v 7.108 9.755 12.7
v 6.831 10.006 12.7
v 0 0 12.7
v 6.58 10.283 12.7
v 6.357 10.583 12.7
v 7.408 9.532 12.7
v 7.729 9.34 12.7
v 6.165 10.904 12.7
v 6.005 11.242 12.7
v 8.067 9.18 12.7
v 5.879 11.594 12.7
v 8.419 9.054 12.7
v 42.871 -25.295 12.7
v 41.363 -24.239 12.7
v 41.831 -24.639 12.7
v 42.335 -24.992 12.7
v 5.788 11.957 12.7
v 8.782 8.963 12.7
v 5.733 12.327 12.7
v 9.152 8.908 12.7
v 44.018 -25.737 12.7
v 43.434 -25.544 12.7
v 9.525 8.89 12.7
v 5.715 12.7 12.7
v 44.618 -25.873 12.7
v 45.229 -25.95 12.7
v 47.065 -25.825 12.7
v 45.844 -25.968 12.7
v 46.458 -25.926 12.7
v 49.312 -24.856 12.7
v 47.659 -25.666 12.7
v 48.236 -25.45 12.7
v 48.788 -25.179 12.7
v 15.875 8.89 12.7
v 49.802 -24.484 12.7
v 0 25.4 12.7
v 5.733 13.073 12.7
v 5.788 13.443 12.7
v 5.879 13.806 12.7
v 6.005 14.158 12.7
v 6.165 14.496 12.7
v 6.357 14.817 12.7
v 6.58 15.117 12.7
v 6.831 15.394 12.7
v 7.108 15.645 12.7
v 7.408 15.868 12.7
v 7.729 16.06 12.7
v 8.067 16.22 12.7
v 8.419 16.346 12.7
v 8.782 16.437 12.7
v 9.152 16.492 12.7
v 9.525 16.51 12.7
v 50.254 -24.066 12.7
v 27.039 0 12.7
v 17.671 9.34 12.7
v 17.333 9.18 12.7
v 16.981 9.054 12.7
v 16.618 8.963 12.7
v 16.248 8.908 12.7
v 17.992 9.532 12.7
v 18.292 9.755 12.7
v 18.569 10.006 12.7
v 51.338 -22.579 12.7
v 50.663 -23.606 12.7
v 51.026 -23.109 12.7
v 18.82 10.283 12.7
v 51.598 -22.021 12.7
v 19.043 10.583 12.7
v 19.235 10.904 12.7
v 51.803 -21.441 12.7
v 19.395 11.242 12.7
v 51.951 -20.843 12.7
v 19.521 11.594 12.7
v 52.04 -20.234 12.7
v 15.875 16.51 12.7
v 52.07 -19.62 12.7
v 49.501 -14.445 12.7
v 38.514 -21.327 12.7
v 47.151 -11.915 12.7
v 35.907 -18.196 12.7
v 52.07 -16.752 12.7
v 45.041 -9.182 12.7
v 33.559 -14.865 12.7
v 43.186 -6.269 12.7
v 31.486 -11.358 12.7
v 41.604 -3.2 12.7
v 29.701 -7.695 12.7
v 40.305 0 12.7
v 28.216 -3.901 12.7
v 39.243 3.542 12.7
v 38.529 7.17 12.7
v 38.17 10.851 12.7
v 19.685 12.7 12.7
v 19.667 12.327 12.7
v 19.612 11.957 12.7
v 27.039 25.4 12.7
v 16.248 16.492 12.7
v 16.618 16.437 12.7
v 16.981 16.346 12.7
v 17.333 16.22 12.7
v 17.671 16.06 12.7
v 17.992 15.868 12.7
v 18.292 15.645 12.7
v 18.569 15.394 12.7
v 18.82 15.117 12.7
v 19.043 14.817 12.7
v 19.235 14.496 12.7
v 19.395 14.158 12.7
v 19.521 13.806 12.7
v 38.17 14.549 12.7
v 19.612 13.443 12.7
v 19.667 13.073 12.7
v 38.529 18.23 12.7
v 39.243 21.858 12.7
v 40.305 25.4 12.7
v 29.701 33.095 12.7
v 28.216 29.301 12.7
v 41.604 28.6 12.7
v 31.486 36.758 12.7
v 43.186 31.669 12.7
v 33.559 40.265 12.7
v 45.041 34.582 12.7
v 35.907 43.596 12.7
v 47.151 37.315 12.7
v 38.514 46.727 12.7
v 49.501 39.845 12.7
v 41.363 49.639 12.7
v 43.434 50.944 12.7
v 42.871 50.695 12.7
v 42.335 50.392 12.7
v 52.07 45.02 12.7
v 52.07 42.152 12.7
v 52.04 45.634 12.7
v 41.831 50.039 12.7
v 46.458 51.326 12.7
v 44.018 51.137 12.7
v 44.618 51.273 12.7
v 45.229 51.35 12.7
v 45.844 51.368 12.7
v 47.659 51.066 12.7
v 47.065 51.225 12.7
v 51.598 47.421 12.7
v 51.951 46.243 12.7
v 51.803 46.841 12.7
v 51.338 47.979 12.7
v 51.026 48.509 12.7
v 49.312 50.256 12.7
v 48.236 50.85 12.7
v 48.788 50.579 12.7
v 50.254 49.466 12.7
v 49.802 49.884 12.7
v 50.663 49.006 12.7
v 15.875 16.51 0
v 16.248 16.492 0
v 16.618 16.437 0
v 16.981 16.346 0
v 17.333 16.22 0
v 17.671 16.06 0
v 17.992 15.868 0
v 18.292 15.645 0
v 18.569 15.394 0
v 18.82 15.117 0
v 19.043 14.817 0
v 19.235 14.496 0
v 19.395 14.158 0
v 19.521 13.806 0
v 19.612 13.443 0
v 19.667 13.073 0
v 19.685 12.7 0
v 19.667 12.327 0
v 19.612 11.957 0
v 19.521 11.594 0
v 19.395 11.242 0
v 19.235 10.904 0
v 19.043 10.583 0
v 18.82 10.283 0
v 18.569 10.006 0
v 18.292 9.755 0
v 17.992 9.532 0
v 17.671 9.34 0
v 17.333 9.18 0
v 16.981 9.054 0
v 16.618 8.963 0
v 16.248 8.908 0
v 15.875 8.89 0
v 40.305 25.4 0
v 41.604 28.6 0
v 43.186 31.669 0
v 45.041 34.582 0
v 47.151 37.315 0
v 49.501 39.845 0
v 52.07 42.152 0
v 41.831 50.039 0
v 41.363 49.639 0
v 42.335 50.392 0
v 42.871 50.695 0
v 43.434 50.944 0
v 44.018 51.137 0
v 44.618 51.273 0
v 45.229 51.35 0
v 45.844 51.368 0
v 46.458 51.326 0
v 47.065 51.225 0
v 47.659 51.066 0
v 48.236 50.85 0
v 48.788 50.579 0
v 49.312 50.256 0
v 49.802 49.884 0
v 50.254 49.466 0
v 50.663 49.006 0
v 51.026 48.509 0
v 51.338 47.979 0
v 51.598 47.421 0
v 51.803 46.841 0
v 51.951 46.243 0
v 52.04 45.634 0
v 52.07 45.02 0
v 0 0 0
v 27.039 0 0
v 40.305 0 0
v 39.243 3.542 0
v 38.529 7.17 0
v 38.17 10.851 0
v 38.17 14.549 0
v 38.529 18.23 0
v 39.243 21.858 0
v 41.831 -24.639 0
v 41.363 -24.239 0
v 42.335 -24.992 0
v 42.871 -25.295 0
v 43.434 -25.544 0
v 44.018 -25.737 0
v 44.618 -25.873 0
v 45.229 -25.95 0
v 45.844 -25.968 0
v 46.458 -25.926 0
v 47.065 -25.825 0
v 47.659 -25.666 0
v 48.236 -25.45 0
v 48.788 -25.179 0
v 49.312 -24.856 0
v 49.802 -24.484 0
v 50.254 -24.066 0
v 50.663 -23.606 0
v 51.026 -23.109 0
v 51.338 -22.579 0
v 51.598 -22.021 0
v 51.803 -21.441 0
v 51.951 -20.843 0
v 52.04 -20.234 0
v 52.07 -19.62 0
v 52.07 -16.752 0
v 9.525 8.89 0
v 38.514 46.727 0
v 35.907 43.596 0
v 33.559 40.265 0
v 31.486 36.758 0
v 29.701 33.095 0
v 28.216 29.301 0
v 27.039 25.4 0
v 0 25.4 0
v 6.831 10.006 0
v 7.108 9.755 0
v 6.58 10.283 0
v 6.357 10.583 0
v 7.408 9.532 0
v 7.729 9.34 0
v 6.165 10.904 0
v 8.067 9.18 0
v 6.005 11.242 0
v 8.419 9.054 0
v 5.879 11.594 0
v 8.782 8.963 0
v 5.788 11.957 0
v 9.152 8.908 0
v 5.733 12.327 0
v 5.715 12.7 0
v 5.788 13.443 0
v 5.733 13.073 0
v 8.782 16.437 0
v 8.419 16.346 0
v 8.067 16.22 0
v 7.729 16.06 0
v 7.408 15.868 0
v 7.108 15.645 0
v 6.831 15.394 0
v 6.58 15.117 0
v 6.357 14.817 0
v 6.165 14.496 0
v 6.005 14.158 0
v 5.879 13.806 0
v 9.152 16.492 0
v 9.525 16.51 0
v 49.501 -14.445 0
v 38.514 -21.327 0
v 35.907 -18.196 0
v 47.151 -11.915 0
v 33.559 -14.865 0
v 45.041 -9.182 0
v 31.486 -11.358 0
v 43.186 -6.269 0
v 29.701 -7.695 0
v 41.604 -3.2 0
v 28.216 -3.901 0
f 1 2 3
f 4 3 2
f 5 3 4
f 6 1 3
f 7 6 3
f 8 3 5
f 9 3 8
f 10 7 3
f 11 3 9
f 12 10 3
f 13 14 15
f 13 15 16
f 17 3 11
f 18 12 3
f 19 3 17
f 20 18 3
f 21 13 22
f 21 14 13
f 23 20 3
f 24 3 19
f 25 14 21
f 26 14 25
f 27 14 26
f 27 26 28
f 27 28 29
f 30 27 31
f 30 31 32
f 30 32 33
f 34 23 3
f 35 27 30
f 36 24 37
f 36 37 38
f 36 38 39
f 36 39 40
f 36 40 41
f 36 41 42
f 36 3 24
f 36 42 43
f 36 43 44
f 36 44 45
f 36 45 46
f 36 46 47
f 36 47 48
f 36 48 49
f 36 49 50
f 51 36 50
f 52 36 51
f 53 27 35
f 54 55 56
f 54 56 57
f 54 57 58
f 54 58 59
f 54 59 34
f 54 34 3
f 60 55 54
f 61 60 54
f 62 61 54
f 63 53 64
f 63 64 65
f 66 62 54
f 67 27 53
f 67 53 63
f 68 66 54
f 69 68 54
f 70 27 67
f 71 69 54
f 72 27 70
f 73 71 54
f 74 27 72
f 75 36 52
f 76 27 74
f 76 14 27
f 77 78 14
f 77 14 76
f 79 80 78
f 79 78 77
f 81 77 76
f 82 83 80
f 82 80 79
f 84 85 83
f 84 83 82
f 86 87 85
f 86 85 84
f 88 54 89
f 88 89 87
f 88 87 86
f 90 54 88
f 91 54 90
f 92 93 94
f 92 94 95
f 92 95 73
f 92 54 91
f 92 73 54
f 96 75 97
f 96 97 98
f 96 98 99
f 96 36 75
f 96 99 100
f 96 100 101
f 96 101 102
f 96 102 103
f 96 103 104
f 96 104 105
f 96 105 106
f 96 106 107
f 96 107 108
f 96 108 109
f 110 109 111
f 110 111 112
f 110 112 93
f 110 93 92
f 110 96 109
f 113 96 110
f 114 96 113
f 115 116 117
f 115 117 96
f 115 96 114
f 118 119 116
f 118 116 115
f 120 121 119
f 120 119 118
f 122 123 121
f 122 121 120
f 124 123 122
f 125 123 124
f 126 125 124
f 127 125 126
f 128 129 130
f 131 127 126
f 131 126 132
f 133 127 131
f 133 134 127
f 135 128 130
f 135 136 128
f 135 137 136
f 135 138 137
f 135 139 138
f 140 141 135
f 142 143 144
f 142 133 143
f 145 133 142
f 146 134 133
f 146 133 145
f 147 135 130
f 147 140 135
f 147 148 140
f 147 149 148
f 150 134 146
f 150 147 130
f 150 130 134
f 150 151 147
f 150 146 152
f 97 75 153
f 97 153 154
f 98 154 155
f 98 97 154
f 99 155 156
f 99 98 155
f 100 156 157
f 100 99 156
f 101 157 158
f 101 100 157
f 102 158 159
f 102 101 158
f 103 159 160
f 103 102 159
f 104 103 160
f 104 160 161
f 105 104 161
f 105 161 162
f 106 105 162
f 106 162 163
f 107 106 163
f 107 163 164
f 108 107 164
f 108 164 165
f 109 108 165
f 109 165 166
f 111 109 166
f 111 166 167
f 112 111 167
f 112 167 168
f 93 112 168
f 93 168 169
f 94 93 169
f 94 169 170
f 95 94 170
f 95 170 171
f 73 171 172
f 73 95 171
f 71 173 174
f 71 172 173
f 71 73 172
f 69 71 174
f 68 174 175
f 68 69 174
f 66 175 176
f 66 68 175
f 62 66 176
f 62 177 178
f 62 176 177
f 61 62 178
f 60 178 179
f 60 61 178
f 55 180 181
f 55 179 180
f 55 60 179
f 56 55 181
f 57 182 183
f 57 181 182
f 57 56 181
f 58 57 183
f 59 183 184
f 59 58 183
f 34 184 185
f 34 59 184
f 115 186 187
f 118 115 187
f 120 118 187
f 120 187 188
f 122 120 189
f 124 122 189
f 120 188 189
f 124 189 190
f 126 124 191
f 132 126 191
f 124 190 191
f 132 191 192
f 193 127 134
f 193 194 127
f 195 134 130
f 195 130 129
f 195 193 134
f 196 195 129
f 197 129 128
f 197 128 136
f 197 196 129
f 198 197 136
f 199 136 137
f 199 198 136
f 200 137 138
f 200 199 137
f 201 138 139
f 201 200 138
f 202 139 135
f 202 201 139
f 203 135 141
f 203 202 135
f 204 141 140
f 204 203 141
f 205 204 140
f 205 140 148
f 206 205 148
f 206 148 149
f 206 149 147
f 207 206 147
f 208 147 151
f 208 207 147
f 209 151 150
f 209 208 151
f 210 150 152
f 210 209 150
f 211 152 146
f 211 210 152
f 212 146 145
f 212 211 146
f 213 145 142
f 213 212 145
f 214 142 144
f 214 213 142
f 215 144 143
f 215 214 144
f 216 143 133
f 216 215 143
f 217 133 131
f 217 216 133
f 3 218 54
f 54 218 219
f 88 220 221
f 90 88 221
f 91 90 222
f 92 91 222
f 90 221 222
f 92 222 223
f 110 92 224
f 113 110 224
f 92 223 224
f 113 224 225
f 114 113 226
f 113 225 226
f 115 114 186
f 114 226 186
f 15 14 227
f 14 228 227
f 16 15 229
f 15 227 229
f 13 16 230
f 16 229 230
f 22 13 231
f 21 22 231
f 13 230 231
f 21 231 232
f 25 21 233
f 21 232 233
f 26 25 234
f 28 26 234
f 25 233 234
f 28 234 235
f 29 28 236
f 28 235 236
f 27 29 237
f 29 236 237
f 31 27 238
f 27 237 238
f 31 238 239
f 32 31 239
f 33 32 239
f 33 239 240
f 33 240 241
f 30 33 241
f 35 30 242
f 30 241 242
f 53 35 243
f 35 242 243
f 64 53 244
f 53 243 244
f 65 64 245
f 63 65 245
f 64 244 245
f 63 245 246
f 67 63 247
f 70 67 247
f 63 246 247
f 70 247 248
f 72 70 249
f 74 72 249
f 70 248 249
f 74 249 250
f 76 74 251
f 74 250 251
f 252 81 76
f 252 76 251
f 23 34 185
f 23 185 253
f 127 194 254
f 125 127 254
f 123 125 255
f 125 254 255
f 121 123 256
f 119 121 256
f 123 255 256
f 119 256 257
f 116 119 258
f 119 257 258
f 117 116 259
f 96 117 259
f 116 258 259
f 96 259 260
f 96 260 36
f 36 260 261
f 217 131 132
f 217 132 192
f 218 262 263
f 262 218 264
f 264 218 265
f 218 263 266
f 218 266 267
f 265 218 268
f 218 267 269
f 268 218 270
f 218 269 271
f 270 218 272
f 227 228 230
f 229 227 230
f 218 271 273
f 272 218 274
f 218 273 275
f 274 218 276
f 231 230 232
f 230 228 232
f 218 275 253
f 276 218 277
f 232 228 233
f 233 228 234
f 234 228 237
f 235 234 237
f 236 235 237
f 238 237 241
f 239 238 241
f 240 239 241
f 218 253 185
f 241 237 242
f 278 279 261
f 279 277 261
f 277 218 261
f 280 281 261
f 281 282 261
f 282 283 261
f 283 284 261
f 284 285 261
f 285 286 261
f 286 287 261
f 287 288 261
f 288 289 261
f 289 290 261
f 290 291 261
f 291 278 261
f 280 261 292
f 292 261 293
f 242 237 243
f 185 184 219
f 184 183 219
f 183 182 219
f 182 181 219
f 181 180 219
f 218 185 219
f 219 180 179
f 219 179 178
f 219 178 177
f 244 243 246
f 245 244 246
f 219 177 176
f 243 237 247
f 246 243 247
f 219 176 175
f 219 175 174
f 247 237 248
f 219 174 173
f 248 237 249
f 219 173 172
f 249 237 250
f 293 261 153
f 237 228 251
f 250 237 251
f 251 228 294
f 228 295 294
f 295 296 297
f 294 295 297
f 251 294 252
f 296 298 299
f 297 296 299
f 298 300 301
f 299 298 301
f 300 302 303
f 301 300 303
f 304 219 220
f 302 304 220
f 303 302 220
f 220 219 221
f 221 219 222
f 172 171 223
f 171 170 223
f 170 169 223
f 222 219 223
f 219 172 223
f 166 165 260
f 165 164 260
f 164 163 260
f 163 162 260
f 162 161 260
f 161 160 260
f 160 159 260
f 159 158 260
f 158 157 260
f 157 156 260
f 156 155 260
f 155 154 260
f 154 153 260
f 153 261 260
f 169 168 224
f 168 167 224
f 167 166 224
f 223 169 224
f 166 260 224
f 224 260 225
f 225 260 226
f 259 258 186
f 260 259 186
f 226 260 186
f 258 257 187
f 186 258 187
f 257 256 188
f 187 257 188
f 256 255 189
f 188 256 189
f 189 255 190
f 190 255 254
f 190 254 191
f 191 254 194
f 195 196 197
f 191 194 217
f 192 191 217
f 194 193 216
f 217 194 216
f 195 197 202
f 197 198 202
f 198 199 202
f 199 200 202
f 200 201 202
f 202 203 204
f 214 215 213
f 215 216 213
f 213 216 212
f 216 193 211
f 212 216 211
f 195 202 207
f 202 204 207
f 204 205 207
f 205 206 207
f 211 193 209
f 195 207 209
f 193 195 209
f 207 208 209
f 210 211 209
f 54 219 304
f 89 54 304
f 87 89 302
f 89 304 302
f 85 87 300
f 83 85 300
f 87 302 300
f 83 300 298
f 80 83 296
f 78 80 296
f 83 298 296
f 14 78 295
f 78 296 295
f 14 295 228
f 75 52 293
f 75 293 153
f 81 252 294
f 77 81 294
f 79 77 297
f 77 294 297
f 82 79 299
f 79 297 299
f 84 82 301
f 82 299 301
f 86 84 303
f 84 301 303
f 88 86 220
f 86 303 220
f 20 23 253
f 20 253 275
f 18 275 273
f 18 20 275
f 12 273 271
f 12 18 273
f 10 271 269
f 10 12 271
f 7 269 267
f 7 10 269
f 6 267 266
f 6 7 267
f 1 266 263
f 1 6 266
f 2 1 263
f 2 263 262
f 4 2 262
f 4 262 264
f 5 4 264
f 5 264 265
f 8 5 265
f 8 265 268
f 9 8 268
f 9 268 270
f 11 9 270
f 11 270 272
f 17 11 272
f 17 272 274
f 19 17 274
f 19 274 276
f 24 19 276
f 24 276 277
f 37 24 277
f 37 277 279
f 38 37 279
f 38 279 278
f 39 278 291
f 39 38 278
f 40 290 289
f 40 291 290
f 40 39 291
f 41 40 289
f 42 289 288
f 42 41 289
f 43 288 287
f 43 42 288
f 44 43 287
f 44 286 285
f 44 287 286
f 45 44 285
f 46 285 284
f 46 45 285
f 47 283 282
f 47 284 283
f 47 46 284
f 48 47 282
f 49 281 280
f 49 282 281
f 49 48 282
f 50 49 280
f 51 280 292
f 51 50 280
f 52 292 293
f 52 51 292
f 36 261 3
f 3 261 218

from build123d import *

# Parameters (mm, degrees)
SKETCH1_R           = 3.81
BOSS_EXTRUDE1_DEPTH = 12.7
SKETCH5_W           = 108.117548543
SKETCH5_H           = 153.094987558
CUT_EXTRUDE2_DEPTH  = 18.78
FILLET1_R           = 6.35
CUT_EXTRUDE3_DEPTH  = 13.7
SKETCH4_R           = 4.7625
CUT_EXTRUDE1_DEPTH  = 12.7


with BuildPart() as part:
    # Sketch1 → Boss-Extrude1 (new body)
    with BuildSketch(Plane.XY):
        with BuildLine():
            Line((0, 25.4), (0, 0))
            Line((0, 0), (27.038931816, 0))
            ThreePointArc((27.038931816, 0), (25.425, 12.7), (27.038931816, 25.4))
            Line((27.038931816, 25.4), (0, 25.4))
        make_face()
        with Locations((12.7, 12.7)):
            Circle(SKETCH1_R, mode=Mode.SUBTRACT)
        with BuildLine():
            ThreePointArc((27.038931816, 25.4), (25.425, 12.7), (27.038931816, 0))
            Line((27.038931816, 0), (40.305493108, 0))
            ThreePointArc((40.305493108, 0), (38.125, 12.7), (40.305493108, 25.4))
            Line((40.305493108, 25.4), (27.038931816, 25.4))
        make_face()
        with BuildLine():
            ThreePointArc((69.85, 63.076364746), (42.655301643, 50.816319827), (27.038931816, 25.4))
            Line((27.038931816, 25.4), (40.305493108, 25.4))
            ThreePointArc((40.305493108, 25.4), (51.696372754, 41.842372532), (69.85, 50.241751757))
            Line((69.85, 50.241751757), (69.85, 63.076364746))
        make_face()
        with BuildLine():
            Line((40.305493108, 0), (27.038931816, 0))
            ThreePointArc((27.038931816, 0), (42.655301643, -25.416319827), (69.85, -37.676364746))
            Line((69.85, -37.676364746), (69.85, -24.841751757))
            ThreePointArc((69.85, -24.841751757), (51.696372754, -16.442372532), (40.305493108, 0))
        make_face()
    extrude(amount=BOSS_EXTRUDE1_DEPTH)

    # Sketch5 → Cut-Extrude2 (cut, through all)
    with BuildSketch(Plane(origin=(52.07, 0, 0), x_dir=(0, 0, -1), z_dir=(1, 0, 0))):
        with Locations((4.394422663, 1.362842318)):
            Rectangle(SKETCH5_W, SKETCH5_H)
    extrude(amount=CUT_EXTRUDE2_DEPTH, mode=Mode.SUBTRACT)

    # Fillet1
    fillet1_edges = [part.edges().sort_by_distance(p)[0] for p in [
        (52.07, 57.374866816, 6.35),
        (52.07, -31.974866816, 6.35),
    ]]
    fillet(fillet1_edges, radius=FILLET1_R)

    # Sketch6 → Cut-Extrude3 (cut, through all)
    with BuildSketch(Plane.XY.offset(12.7)):
        with BuildLine():
            Line((9.525, 16.51), (15.875, 16.51))
            ThreePointArc((15.875, 16.51), (19.685, 12.7), (15.875, 8.89))
            Line((15.875, 8.89), (9.525, 8.89))
            ThreePointArc((9.525, 8.89), (5.715, 12.7), (9.525, 16.51))
        make_face()
    extrude(amount=-CUT_EXTRUDE3_DEPTH, mode=Mode.SUBTRACT)

    # Sketch4 → Cut-Extrude1 (cut)
    with BuildSketch(Plane(origin=(53.975, 0, 0), x_dir=(0, 0, -1), z_dir=(1, 0, 0))):
        with Locations((-6.35, -31.259058251)):
            Circle(SKETCH4_R)
        with Locations((-6.35, 56.659058251)):
            Circle(SKETCH4_R)
    extrude(amount=-CUT_EXTRUDE1_DEPTH, mode=Mode.SUBTRACT)


solid = part.part
